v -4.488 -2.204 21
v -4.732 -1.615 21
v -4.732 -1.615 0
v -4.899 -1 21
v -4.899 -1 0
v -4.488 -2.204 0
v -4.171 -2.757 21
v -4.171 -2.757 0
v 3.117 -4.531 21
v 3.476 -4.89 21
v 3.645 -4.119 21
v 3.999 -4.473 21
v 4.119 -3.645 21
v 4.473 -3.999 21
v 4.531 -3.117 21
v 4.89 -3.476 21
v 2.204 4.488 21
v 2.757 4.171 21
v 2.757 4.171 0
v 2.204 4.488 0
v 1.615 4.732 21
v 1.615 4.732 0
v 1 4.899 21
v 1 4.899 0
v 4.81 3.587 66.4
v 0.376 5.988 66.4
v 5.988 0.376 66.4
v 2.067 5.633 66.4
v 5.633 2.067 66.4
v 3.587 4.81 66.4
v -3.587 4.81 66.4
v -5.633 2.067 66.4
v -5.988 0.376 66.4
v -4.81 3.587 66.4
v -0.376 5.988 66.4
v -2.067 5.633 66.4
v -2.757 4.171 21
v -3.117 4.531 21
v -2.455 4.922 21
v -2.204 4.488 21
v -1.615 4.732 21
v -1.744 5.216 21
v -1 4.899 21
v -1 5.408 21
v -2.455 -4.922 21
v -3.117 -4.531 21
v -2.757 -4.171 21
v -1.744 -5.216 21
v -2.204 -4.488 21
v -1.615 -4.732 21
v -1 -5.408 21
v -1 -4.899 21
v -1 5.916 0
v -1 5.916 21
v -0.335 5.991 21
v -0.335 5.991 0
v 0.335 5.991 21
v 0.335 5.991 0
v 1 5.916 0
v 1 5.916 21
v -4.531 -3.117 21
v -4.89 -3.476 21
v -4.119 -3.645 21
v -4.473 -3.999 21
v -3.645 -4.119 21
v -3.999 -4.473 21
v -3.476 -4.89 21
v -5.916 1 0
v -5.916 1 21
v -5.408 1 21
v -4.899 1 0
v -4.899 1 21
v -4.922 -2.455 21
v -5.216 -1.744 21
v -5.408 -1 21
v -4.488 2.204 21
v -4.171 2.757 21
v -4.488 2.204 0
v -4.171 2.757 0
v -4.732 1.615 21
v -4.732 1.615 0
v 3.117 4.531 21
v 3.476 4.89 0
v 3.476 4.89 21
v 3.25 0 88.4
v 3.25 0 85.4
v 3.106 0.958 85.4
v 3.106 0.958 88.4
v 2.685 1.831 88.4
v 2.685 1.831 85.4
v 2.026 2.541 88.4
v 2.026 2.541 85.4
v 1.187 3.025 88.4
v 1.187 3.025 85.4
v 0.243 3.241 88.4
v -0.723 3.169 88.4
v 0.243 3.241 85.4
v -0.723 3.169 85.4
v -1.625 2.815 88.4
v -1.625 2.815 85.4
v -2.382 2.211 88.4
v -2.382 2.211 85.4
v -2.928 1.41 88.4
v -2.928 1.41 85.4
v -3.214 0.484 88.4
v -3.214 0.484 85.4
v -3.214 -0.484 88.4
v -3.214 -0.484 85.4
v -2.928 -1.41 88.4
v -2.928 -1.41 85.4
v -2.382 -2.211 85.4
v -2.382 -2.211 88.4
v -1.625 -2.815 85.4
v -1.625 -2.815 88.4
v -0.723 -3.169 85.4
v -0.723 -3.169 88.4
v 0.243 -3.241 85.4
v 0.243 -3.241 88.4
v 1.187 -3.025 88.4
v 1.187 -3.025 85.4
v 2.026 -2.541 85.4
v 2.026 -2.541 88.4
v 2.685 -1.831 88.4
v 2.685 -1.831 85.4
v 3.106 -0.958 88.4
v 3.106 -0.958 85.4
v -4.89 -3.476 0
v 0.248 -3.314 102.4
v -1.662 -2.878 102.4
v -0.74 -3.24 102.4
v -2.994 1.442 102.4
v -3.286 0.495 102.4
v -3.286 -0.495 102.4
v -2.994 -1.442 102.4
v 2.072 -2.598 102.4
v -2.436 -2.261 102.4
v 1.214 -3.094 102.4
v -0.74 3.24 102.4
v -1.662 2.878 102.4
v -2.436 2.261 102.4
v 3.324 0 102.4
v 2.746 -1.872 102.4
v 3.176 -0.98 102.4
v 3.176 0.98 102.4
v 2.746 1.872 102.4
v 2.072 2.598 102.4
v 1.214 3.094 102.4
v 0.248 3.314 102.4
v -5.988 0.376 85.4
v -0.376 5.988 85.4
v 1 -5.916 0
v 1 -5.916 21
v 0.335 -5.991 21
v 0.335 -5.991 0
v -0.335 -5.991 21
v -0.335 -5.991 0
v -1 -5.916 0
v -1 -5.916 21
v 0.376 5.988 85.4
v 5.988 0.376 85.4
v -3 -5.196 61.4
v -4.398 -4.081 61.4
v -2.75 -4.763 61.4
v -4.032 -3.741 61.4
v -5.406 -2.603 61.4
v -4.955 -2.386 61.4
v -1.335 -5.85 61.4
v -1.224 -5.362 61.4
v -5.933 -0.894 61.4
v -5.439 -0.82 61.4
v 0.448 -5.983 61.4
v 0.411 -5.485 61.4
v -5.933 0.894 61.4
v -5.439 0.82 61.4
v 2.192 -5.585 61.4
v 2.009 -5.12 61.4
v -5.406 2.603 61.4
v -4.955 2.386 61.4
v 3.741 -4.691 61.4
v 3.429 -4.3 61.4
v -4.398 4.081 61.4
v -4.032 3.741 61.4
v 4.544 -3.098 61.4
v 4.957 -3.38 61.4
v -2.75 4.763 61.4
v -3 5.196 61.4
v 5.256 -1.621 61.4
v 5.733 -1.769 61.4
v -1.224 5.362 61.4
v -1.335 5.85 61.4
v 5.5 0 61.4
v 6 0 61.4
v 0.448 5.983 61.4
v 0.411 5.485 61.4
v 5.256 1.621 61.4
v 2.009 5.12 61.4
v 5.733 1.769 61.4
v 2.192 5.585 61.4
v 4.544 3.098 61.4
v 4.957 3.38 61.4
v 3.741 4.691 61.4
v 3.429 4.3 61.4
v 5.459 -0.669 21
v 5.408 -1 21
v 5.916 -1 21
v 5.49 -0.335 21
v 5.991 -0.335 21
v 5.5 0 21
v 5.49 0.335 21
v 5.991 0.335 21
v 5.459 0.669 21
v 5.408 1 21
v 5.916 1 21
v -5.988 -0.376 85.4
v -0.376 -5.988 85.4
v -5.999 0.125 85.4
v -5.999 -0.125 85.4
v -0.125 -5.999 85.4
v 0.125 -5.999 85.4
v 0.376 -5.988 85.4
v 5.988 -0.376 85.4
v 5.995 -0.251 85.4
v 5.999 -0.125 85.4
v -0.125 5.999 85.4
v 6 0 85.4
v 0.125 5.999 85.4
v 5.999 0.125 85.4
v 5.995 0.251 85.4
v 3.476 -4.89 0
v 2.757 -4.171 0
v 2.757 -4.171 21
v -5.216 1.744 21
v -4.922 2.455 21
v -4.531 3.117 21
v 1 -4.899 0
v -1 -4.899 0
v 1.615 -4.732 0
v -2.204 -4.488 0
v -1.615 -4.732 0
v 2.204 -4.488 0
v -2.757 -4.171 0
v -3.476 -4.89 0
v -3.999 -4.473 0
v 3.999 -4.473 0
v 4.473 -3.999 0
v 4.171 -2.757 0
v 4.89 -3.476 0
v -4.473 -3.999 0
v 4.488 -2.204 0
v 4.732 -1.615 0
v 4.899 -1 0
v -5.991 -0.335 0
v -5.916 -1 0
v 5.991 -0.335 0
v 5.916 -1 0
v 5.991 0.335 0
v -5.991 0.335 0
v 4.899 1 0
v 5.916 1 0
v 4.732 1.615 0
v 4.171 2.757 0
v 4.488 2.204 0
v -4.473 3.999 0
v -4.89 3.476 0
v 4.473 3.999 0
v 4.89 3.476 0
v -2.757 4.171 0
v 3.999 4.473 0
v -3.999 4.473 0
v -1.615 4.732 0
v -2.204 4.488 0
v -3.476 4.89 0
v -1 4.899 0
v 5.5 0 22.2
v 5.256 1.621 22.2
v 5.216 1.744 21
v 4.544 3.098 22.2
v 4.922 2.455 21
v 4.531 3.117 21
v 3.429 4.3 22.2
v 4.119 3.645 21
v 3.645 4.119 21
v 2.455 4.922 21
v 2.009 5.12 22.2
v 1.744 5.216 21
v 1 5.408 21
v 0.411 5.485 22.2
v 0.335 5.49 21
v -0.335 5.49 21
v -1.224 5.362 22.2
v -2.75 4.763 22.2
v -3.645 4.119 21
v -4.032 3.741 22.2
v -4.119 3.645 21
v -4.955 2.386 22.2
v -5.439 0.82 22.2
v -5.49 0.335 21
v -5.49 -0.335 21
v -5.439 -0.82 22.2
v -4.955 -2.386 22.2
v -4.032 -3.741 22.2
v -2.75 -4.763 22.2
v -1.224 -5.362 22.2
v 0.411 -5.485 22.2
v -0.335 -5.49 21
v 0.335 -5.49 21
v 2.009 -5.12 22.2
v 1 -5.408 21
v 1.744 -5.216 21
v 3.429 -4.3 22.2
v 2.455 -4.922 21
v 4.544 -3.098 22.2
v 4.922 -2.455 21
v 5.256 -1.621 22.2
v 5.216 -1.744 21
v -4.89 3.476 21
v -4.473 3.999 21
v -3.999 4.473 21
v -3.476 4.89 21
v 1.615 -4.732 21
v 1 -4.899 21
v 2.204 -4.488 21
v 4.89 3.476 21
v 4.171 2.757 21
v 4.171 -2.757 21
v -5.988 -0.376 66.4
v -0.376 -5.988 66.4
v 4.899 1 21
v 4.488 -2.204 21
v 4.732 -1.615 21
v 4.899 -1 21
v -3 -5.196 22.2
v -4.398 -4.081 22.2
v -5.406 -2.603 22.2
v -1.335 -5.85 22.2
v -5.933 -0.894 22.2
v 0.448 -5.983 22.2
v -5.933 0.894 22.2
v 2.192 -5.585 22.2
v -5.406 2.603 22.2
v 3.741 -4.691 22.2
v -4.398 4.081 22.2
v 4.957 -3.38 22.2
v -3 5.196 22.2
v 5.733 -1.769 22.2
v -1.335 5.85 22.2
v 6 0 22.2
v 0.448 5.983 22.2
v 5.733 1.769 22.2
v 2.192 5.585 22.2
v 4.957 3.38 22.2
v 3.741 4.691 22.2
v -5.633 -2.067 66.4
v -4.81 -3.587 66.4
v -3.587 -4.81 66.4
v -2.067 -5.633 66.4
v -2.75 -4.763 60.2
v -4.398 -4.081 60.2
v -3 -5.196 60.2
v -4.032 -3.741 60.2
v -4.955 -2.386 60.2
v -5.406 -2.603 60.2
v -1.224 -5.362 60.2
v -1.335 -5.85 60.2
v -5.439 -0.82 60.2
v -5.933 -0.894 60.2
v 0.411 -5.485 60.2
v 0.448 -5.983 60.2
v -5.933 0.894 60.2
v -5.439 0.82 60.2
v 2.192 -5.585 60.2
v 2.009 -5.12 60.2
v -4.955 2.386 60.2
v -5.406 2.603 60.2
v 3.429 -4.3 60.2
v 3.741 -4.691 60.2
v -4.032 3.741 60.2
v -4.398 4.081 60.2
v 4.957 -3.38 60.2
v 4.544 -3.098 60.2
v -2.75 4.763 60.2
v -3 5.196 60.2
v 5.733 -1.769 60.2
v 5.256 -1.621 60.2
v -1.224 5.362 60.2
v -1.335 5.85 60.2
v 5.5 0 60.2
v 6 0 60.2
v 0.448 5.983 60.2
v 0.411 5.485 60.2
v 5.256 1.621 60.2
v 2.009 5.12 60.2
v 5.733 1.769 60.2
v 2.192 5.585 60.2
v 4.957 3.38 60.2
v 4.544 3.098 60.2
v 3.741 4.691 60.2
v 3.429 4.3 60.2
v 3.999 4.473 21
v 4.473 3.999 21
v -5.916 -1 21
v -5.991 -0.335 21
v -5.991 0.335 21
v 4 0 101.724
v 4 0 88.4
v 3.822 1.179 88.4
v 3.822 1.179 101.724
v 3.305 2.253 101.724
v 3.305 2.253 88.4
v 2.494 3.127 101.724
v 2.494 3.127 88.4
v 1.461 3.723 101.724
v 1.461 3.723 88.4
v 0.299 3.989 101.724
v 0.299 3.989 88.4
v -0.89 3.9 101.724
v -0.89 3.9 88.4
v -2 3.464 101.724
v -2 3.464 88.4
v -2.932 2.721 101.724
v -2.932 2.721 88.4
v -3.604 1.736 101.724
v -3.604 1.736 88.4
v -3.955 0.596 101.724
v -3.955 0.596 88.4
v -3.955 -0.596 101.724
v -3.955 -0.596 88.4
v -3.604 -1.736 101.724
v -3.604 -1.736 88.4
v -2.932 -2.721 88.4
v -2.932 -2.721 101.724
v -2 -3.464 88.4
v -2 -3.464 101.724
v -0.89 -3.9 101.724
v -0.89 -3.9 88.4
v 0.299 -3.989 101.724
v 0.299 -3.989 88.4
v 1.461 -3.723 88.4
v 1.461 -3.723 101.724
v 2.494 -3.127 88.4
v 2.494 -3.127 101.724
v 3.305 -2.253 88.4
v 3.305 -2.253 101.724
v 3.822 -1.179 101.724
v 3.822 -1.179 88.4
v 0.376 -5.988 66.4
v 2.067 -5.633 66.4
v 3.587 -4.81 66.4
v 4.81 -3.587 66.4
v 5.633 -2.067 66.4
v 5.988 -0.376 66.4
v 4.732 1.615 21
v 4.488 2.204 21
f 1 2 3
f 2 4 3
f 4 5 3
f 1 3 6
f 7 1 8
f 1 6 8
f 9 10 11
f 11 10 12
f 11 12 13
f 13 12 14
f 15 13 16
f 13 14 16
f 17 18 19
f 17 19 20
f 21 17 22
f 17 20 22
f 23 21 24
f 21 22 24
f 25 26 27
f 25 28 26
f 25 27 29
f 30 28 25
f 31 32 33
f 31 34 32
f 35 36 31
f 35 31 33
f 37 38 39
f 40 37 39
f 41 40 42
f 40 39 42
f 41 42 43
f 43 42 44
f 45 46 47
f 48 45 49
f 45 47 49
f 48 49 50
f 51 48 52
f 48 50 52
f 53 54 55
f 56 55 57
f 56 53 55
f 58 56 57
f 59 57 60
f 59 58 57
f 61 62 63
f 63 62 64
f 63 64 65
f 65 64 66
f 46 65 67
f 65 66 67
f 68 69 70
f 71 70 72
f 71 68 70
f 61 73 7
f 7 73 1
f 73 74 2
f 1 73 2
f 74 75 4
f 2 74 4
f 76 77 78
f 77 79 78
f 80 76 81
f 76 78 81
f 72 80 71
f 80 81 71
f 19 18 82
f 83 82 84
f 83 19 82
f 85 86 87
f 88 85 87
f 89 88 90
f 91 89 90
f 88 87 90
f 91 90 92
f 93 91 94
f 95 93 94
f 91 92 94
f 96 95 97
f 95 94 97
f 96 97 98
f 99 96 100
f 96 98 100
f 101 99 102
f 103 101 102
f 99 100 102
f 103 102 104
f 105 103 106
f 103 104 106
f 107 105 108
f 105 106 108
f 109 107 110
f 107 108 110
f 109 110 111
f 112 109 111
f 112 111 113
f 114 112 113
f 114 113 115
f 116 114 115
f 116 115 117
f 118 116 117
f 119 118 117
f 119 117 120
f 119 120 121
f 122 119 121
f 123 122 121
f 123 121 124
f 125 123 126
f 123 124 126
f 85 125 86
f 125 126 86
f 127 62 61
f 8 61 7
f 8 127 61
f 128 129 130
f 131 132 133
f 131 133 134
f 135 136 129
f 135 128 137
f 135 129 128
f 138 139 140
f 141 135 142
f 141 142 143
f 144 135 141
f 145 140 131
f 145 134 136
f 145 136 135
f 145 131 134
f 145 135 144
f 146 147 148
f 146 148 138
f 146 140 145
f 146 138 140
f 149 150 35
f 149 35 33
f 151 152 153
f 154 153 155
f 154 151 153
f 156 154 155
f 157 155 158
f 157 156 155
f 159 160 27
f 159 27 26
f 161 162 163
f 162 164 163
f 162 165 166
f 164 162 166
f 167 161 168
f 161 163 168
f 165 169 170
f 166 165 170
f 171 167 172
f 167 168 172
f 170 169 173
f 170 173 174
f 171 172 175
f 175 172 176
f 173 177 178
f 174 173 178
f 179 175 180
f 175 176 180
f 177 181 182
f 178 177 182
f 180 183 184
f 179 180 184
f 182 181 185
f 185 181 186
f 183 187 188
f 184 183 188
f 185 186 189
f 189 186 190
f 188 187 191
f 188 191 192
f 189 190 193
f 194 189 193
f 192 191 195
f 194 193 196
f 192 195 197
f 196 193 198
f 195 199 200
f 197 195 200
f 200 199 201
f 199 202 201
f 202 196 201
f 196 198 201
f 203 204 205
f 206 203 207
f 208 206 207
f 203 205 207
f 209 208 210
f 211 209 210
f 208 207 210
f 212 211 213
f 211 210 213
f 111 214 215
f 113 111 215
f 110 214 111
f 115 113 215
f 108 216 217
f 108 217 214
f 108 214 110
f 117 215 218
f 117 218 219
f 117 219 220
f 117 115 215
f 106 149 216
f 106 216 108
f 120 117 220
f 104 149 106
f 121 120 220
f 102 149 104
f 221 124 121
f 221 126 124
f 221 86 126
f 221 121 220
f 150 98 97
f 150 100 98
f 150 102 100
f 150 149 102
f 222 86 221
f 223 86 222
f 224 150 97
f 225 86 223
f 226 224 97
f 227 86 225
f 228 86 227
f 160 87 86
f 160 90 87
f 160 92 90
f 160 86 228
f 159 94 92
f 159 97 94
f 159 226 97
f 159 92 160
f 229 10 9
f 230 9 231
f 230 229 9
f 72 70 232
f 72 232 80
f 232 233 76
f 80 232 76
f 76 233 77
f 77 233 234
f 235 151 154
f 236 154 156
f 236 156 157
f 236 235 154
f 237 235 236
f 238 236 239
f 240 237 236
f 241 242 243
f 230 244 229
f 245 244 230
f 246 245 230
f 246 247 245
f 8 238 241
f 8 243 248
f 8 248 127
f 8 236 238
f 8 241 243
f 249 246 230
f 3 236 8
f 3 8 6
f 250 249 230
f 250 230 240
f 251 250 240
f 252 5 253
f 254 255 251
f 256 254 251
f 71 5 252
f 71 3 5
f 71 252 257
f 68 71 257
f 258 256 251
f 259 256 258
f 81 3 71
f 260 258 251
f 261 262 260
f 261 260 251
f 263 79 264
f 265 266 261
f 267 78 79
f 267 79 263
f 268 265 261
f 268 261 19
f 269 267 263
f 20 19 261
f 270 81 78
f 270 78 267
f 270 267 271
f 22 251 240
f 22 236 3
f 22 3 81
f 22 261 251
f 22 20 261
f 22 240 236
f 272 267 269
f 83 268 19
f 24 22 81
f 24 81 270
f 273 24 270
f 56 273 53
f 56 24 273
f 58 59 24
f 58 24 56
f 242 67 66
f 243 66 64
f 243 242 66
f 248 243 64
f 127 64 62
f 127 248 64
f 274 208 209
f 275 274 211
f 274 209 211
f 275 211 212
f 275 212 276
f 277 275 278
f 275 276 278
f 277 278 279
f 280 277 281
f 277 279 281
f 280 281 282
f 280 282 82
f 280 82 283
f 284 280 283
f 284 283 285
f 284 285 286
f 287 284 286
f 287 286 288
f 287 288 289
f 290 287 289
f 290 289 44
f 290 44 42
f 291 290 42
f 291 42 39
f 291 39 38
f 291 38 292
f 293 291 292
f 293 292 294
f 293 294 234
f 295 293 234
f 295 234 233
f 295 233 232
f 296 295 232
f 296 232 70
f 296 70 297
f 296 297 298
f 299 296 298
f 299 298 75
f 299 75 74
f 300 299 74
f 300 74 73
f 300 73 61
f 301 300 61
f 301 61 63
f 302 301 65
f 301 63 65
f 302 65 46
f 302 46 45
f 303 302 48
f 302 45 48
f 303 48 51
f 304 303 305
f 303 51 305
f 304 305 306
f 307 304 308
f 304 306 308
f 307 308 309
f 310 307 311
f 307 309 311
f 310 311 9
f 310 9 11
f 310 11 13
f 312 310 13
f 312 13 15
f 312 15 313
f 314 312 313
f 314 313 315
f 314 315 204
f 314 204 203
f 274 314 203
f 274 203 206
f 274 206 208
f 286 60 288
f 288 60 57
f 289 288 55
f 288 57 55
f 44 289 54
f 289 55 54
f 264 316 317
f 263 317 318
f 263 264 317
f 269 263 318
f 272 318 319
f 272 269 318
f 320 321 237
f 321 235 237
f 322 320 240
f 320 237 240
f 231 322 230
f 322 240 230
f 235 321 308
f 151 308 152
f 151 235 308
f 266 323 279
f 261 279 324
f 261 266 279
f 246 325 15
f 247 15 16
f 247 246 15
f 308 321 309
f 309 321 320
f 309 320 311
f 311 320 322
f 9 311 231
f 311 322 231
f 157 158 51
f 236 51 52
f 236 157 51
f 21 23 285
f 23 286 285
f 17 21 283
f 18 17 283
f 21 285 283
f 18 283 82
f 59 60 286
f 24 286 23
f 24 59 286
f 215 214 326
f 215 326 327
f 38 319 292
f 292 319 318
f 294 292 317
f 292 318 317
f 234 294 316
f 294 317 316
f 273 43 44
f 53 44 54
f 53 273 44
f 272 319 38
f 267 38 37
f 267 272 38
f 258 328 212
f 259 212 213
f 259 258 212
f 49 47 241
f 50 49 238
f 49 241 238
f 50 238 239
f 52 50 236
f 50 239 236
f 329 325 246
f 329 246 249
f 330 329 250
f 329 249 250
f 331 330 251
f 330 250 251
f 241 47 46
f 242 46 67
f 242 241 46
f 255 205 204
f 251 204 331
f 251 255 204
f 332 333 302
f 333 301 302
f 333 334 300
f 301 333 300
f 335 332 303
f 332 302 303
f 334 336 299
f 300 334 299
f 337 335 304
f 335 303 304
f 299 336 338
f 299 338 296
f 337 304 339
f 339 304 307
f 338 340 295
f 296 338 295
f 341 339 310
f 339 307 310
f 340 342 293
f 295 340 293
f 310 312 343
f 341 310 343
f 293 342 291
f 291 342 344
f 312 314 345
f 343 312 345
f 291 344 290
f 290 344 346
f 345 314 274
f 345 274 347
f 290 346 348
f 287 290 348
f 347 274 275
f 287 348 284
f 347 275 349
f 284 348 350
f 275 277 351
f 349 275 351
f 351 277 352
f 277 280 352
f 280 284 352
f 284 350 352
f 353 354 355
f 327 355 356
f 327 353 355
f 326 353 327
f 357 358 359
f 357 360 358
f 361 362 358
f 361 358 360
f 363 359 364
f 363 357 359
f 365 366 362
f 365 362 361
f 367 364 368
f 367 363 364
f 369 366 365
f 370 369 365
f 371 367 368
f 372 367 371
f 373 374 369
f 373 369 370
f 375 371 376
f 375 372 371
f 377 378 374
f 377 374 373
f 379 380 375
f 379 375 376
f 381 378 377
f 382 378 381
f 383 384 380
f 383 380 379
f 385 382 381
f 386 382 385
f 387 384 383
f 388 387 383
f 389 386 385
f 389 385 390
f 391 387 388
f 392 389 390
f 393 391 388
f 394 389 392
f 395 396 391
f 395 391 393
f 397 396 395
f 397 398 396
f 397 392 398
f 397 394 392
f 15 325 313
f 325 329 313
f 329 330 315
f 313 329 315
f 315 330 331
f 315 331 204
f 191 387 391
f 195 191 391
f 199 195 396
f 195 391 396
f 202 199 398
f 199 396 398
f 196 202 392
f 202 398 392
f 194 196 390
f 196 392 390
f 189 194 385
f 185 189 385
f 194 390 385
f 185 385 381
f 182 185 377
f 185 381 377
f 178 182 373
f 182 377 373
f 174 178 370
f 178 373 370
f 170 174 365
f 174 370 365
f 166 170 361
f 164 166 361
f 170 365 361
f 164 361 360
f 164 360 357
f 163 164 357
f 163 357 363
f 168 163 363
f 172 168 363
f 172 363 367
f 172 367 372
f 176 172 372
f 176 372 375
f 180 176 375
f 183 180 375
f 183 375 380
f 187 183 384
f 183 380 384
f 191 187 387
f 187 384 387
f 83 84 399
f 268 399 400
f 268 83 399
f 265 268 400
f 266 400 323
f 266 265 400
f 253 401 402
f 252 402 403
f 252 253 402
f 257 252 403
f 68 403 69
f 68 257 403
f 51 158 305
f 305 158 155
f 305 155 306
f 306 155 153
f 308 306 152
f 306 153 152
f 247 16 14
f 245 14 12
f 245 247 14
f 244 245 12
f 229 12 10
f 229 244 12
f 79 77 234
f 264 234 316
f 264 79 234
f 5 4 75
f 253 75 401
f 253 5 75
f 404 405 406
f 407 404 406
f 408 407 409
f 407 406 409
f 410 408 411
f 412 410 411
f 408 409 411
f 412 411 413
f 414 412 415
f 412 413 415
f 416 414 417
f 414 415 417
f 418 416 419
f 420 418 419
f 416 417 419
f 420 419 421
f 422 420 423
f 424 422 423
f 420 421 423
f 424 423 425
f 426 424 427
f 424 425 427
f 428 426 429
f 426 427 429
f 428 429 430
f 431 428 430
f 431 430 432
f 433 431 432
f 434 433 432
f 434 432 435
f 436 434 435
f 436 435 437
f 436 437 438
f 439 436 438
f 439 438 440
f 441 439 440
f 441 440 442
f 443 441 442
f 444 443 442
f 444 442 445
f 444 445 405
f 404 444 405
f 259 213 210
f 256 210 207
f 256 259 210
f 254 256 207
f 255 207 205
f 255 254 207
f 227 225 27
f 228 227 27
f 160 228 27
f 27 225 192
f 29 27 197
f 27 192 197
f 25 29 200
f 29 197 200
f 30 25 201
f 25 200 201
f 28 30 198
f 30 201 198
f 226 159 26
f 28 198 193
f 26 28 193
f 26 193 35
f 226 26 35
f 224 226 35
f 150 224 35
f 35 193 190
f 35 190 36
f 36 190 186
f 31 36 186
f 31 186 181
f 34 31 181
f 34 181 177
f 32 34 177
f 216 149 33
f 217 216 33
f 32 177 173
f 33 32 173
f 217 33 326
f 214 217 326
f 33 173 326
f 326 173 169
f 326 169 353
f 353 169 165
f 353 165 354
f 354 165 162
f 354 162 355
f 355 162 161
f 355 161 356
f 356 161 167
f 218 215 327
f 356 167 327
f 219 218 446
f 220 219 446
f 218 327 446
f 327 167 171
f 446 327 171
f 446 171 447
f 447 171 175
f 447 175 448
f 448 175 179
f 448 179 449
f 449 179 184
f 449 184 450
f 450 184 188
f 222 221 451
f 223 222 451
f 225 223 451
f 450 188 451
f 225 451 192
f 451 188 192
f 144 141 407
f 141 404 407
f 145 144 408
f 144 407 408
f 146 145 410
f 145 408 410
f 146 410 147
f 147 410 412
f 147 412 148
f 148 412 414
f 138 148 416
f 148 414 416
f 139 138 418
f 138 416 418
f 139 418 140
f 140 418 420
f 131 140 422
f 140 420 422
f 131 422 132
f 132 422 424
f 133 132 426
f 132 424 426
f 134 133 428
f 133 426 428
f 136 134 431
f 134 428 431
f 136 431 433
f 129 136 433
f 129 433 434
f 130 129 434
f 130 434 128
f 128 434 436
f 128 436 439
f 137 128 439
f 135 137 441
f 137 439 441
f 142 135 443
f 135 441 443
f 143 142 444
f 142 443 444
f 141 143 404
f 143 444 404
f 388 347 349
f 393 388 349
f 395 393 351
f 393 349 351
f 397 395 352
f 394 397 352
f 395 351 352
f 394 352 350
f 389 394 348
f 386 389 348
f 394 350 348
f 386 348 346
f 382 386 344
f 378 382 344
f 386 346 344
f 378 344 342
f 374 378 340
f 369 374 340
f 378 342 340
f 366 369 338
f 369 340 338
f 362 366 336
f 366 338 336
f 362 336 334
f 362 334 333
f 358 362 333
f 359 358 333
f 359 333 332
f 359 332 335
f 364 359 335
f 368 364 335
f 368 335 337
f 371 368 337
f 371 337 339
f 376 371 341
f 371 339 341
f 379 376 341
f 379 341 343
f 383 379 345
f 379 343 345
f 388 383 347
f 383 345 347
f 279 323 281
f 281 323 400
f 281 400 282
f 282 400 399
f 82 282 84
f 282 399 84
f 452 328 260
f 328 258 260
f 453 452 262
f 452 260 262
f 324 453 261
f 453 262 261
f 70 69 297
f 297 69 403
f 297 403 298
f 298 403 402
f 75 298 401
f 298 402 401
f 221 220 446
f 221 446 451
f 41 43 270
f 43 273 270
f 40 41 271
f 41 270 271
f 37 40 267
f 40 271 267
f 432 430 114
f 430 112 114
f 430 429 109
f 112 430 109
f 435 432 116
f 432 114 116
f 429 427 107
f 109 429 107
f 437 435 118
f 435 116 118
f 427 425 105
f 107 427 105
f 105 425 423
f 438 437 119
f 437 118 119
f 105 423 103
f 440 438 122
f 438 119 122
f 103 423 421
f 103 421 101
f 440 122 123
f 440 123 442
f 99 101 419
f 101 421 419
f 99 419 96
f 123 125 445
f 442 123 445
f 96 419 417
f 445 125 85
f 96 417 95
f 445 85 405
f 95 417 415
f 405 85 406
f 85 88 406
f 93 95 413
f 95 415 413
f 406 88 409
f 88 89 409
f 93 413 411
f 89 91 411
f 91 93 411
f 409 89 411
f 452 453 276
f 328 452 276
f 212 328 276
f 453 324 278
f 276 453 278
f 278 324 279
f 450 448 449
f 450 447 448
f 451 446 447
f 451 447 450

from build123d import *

# Parameters (mm, degrees)
SKETCH_1_R               = 5
EXTRUDE_1_DEPTH          = 21
SKETCH_2_R               = 5.5
EXTRUDE_2_DEPTH          = 1.2
SKETCH_3_R               = 6
EXTRUDE_3_DEPTH          = 38
SKETCH_4_R               = 5.5
EXTRUDE_4_DEPTH          = 1.2
SKETCH_5_R               = 6
EXTRUDE_5_DEPTH          = 24
SKETCH_6_R               = 3.25
EXTRUDE_6_DEPTH          = 3
SKETCH_7_R               = 4
EXTRUDE_7_DEPTH          = 14
SKETCH_9_OUTSIDE_W       = 34.76
SKETCH_9_OUTSIDE_H       = 34.76
CUT_EXTRUDE_1_DEPTH      = 19
EXTRUDE_8_DEPTH          = 21
PATTERN_CIRCULAR_1_COUNT = 8


# Read off the part's stored shape, not the designer's step: M8 机械螺纹 螺柱1
with BuildPart() as part:
    # 草图1 → 凸台-拉伸1 (new body)
    with BuildSketch(Plane.XY):
        with Locations(Location((0, 0, 0), (0, 0, 180))):
            Circle(SKETCH_1_R)
    extrude(amount=EXTRUDE_1_DEPTH)

    # 草图2 → 凸台-拉伸2 (add)
    with BuildSketch(Plane.XY.offset(21)):
        Circle(SKETCH_2_R)
    extrude(amount=EXTRUDE_2_DEPTH)

    # 草图3 → 凸台-拉伸3 (add)
    with BuildSketch(Plane.XY.offset(22.2)):
        Circle(SKETCH_3_R)
    extrude(amount=EXTRUDE_3_DEPTH)

    # 草图4 → 凸台-拉伸4 (add)
    with BuildSketch(Plane.XY.offset(60.2)):
        Circle(SKETCH_4_R)
    extrude(amount=EXTRUDE_4_DEPTH)

    # 草图5 → 凸台-拉伸5 (add)
    with BuildSketch(Plane.XY.offset(61.4)):
        Circle(SKETCH_5_R)
    extrude(amount=EXTRUDE_5_DEPTH)

    # 草图6 → 凸台-拉伸6 (add)
    with BuildSketch(Plane.XY.offset(85.4)):
        Circle(SKETCH_6_R)
    extrude(amount=EXTRUDE_6_DEPTH)

    # 草图7 → 凸台-拉伸7 (add)
    with BuildSketch(Plane.XY.offset(88.4)):
        Circle(SKETCH_7_R)
    extrude(amount=EXTRUDE_7_DEPTH)

    # M8 机械螺纹 螺柱1 outline → M8 机械螺纹 螺柱1 (revolve, cut)
    with BuildSketch(Plane.XZ):
        Polygon((4, 102.4), (3.3235, 102.4), (4, 101.7235), align=None)
    revolve(axis=Axis((0, 0, 0), (0, 0, 1)), mode=Mode.SUBTRACT)

    # 草图9 outside → 切除-拉伸1 (cut)
    with BuildSketch(Plane.XY.offset(85.4)):
        Rectangle(SKETCH_9_OUTSIDE_W, SKETCH_9_OUTSIDE_H)
        Polygon((0, -6.363961031), (6.363961031, 0), (0, 6.363961031), (-6.363961031, 0), align=None, mode=Mode.SUBTRACT)
    extrude(amount=-CUT_EXTRUDE_1_DEPTH, mode=Mode.SUBTRACT)

    # 草图10 → 凸台-拉伸8 (add)
    with BuildSketch(Plane(origin=(0, 0, 0), x_dir=(-1, 0, 0), z_dir=(0, 0, -1))):
        with BuildLine():
            ThreePointArc((1, 5.916079783), (0, 6), (-1, 5.916079783))
            Line((-1, 5.916079783), (-1, 4.898979486))
            ThreePointArc((-1, 4.898979486), (0, 5), (1, 4.898979486))
            Line((1, 4.898979486), (1, 5.916079783))
        make_face()
    extrude_8 = extrude(amount=-EXTRUDE_8_DEPTH)

    # 阵列(圆周)1: 凸台-拉伸8 ×8 about axis
    pattern_circular_1_axis = Axis((0, 0, 0), (0, 0, 1))
    for i in range(1, PATTERN_CIRCULAR_1_COUNT):
        add(extrude_8.rotate(pattern_circular_1_axis, i * 360 / PATTERN_CIRCULAR_1_COUNT))


solid = part.part
